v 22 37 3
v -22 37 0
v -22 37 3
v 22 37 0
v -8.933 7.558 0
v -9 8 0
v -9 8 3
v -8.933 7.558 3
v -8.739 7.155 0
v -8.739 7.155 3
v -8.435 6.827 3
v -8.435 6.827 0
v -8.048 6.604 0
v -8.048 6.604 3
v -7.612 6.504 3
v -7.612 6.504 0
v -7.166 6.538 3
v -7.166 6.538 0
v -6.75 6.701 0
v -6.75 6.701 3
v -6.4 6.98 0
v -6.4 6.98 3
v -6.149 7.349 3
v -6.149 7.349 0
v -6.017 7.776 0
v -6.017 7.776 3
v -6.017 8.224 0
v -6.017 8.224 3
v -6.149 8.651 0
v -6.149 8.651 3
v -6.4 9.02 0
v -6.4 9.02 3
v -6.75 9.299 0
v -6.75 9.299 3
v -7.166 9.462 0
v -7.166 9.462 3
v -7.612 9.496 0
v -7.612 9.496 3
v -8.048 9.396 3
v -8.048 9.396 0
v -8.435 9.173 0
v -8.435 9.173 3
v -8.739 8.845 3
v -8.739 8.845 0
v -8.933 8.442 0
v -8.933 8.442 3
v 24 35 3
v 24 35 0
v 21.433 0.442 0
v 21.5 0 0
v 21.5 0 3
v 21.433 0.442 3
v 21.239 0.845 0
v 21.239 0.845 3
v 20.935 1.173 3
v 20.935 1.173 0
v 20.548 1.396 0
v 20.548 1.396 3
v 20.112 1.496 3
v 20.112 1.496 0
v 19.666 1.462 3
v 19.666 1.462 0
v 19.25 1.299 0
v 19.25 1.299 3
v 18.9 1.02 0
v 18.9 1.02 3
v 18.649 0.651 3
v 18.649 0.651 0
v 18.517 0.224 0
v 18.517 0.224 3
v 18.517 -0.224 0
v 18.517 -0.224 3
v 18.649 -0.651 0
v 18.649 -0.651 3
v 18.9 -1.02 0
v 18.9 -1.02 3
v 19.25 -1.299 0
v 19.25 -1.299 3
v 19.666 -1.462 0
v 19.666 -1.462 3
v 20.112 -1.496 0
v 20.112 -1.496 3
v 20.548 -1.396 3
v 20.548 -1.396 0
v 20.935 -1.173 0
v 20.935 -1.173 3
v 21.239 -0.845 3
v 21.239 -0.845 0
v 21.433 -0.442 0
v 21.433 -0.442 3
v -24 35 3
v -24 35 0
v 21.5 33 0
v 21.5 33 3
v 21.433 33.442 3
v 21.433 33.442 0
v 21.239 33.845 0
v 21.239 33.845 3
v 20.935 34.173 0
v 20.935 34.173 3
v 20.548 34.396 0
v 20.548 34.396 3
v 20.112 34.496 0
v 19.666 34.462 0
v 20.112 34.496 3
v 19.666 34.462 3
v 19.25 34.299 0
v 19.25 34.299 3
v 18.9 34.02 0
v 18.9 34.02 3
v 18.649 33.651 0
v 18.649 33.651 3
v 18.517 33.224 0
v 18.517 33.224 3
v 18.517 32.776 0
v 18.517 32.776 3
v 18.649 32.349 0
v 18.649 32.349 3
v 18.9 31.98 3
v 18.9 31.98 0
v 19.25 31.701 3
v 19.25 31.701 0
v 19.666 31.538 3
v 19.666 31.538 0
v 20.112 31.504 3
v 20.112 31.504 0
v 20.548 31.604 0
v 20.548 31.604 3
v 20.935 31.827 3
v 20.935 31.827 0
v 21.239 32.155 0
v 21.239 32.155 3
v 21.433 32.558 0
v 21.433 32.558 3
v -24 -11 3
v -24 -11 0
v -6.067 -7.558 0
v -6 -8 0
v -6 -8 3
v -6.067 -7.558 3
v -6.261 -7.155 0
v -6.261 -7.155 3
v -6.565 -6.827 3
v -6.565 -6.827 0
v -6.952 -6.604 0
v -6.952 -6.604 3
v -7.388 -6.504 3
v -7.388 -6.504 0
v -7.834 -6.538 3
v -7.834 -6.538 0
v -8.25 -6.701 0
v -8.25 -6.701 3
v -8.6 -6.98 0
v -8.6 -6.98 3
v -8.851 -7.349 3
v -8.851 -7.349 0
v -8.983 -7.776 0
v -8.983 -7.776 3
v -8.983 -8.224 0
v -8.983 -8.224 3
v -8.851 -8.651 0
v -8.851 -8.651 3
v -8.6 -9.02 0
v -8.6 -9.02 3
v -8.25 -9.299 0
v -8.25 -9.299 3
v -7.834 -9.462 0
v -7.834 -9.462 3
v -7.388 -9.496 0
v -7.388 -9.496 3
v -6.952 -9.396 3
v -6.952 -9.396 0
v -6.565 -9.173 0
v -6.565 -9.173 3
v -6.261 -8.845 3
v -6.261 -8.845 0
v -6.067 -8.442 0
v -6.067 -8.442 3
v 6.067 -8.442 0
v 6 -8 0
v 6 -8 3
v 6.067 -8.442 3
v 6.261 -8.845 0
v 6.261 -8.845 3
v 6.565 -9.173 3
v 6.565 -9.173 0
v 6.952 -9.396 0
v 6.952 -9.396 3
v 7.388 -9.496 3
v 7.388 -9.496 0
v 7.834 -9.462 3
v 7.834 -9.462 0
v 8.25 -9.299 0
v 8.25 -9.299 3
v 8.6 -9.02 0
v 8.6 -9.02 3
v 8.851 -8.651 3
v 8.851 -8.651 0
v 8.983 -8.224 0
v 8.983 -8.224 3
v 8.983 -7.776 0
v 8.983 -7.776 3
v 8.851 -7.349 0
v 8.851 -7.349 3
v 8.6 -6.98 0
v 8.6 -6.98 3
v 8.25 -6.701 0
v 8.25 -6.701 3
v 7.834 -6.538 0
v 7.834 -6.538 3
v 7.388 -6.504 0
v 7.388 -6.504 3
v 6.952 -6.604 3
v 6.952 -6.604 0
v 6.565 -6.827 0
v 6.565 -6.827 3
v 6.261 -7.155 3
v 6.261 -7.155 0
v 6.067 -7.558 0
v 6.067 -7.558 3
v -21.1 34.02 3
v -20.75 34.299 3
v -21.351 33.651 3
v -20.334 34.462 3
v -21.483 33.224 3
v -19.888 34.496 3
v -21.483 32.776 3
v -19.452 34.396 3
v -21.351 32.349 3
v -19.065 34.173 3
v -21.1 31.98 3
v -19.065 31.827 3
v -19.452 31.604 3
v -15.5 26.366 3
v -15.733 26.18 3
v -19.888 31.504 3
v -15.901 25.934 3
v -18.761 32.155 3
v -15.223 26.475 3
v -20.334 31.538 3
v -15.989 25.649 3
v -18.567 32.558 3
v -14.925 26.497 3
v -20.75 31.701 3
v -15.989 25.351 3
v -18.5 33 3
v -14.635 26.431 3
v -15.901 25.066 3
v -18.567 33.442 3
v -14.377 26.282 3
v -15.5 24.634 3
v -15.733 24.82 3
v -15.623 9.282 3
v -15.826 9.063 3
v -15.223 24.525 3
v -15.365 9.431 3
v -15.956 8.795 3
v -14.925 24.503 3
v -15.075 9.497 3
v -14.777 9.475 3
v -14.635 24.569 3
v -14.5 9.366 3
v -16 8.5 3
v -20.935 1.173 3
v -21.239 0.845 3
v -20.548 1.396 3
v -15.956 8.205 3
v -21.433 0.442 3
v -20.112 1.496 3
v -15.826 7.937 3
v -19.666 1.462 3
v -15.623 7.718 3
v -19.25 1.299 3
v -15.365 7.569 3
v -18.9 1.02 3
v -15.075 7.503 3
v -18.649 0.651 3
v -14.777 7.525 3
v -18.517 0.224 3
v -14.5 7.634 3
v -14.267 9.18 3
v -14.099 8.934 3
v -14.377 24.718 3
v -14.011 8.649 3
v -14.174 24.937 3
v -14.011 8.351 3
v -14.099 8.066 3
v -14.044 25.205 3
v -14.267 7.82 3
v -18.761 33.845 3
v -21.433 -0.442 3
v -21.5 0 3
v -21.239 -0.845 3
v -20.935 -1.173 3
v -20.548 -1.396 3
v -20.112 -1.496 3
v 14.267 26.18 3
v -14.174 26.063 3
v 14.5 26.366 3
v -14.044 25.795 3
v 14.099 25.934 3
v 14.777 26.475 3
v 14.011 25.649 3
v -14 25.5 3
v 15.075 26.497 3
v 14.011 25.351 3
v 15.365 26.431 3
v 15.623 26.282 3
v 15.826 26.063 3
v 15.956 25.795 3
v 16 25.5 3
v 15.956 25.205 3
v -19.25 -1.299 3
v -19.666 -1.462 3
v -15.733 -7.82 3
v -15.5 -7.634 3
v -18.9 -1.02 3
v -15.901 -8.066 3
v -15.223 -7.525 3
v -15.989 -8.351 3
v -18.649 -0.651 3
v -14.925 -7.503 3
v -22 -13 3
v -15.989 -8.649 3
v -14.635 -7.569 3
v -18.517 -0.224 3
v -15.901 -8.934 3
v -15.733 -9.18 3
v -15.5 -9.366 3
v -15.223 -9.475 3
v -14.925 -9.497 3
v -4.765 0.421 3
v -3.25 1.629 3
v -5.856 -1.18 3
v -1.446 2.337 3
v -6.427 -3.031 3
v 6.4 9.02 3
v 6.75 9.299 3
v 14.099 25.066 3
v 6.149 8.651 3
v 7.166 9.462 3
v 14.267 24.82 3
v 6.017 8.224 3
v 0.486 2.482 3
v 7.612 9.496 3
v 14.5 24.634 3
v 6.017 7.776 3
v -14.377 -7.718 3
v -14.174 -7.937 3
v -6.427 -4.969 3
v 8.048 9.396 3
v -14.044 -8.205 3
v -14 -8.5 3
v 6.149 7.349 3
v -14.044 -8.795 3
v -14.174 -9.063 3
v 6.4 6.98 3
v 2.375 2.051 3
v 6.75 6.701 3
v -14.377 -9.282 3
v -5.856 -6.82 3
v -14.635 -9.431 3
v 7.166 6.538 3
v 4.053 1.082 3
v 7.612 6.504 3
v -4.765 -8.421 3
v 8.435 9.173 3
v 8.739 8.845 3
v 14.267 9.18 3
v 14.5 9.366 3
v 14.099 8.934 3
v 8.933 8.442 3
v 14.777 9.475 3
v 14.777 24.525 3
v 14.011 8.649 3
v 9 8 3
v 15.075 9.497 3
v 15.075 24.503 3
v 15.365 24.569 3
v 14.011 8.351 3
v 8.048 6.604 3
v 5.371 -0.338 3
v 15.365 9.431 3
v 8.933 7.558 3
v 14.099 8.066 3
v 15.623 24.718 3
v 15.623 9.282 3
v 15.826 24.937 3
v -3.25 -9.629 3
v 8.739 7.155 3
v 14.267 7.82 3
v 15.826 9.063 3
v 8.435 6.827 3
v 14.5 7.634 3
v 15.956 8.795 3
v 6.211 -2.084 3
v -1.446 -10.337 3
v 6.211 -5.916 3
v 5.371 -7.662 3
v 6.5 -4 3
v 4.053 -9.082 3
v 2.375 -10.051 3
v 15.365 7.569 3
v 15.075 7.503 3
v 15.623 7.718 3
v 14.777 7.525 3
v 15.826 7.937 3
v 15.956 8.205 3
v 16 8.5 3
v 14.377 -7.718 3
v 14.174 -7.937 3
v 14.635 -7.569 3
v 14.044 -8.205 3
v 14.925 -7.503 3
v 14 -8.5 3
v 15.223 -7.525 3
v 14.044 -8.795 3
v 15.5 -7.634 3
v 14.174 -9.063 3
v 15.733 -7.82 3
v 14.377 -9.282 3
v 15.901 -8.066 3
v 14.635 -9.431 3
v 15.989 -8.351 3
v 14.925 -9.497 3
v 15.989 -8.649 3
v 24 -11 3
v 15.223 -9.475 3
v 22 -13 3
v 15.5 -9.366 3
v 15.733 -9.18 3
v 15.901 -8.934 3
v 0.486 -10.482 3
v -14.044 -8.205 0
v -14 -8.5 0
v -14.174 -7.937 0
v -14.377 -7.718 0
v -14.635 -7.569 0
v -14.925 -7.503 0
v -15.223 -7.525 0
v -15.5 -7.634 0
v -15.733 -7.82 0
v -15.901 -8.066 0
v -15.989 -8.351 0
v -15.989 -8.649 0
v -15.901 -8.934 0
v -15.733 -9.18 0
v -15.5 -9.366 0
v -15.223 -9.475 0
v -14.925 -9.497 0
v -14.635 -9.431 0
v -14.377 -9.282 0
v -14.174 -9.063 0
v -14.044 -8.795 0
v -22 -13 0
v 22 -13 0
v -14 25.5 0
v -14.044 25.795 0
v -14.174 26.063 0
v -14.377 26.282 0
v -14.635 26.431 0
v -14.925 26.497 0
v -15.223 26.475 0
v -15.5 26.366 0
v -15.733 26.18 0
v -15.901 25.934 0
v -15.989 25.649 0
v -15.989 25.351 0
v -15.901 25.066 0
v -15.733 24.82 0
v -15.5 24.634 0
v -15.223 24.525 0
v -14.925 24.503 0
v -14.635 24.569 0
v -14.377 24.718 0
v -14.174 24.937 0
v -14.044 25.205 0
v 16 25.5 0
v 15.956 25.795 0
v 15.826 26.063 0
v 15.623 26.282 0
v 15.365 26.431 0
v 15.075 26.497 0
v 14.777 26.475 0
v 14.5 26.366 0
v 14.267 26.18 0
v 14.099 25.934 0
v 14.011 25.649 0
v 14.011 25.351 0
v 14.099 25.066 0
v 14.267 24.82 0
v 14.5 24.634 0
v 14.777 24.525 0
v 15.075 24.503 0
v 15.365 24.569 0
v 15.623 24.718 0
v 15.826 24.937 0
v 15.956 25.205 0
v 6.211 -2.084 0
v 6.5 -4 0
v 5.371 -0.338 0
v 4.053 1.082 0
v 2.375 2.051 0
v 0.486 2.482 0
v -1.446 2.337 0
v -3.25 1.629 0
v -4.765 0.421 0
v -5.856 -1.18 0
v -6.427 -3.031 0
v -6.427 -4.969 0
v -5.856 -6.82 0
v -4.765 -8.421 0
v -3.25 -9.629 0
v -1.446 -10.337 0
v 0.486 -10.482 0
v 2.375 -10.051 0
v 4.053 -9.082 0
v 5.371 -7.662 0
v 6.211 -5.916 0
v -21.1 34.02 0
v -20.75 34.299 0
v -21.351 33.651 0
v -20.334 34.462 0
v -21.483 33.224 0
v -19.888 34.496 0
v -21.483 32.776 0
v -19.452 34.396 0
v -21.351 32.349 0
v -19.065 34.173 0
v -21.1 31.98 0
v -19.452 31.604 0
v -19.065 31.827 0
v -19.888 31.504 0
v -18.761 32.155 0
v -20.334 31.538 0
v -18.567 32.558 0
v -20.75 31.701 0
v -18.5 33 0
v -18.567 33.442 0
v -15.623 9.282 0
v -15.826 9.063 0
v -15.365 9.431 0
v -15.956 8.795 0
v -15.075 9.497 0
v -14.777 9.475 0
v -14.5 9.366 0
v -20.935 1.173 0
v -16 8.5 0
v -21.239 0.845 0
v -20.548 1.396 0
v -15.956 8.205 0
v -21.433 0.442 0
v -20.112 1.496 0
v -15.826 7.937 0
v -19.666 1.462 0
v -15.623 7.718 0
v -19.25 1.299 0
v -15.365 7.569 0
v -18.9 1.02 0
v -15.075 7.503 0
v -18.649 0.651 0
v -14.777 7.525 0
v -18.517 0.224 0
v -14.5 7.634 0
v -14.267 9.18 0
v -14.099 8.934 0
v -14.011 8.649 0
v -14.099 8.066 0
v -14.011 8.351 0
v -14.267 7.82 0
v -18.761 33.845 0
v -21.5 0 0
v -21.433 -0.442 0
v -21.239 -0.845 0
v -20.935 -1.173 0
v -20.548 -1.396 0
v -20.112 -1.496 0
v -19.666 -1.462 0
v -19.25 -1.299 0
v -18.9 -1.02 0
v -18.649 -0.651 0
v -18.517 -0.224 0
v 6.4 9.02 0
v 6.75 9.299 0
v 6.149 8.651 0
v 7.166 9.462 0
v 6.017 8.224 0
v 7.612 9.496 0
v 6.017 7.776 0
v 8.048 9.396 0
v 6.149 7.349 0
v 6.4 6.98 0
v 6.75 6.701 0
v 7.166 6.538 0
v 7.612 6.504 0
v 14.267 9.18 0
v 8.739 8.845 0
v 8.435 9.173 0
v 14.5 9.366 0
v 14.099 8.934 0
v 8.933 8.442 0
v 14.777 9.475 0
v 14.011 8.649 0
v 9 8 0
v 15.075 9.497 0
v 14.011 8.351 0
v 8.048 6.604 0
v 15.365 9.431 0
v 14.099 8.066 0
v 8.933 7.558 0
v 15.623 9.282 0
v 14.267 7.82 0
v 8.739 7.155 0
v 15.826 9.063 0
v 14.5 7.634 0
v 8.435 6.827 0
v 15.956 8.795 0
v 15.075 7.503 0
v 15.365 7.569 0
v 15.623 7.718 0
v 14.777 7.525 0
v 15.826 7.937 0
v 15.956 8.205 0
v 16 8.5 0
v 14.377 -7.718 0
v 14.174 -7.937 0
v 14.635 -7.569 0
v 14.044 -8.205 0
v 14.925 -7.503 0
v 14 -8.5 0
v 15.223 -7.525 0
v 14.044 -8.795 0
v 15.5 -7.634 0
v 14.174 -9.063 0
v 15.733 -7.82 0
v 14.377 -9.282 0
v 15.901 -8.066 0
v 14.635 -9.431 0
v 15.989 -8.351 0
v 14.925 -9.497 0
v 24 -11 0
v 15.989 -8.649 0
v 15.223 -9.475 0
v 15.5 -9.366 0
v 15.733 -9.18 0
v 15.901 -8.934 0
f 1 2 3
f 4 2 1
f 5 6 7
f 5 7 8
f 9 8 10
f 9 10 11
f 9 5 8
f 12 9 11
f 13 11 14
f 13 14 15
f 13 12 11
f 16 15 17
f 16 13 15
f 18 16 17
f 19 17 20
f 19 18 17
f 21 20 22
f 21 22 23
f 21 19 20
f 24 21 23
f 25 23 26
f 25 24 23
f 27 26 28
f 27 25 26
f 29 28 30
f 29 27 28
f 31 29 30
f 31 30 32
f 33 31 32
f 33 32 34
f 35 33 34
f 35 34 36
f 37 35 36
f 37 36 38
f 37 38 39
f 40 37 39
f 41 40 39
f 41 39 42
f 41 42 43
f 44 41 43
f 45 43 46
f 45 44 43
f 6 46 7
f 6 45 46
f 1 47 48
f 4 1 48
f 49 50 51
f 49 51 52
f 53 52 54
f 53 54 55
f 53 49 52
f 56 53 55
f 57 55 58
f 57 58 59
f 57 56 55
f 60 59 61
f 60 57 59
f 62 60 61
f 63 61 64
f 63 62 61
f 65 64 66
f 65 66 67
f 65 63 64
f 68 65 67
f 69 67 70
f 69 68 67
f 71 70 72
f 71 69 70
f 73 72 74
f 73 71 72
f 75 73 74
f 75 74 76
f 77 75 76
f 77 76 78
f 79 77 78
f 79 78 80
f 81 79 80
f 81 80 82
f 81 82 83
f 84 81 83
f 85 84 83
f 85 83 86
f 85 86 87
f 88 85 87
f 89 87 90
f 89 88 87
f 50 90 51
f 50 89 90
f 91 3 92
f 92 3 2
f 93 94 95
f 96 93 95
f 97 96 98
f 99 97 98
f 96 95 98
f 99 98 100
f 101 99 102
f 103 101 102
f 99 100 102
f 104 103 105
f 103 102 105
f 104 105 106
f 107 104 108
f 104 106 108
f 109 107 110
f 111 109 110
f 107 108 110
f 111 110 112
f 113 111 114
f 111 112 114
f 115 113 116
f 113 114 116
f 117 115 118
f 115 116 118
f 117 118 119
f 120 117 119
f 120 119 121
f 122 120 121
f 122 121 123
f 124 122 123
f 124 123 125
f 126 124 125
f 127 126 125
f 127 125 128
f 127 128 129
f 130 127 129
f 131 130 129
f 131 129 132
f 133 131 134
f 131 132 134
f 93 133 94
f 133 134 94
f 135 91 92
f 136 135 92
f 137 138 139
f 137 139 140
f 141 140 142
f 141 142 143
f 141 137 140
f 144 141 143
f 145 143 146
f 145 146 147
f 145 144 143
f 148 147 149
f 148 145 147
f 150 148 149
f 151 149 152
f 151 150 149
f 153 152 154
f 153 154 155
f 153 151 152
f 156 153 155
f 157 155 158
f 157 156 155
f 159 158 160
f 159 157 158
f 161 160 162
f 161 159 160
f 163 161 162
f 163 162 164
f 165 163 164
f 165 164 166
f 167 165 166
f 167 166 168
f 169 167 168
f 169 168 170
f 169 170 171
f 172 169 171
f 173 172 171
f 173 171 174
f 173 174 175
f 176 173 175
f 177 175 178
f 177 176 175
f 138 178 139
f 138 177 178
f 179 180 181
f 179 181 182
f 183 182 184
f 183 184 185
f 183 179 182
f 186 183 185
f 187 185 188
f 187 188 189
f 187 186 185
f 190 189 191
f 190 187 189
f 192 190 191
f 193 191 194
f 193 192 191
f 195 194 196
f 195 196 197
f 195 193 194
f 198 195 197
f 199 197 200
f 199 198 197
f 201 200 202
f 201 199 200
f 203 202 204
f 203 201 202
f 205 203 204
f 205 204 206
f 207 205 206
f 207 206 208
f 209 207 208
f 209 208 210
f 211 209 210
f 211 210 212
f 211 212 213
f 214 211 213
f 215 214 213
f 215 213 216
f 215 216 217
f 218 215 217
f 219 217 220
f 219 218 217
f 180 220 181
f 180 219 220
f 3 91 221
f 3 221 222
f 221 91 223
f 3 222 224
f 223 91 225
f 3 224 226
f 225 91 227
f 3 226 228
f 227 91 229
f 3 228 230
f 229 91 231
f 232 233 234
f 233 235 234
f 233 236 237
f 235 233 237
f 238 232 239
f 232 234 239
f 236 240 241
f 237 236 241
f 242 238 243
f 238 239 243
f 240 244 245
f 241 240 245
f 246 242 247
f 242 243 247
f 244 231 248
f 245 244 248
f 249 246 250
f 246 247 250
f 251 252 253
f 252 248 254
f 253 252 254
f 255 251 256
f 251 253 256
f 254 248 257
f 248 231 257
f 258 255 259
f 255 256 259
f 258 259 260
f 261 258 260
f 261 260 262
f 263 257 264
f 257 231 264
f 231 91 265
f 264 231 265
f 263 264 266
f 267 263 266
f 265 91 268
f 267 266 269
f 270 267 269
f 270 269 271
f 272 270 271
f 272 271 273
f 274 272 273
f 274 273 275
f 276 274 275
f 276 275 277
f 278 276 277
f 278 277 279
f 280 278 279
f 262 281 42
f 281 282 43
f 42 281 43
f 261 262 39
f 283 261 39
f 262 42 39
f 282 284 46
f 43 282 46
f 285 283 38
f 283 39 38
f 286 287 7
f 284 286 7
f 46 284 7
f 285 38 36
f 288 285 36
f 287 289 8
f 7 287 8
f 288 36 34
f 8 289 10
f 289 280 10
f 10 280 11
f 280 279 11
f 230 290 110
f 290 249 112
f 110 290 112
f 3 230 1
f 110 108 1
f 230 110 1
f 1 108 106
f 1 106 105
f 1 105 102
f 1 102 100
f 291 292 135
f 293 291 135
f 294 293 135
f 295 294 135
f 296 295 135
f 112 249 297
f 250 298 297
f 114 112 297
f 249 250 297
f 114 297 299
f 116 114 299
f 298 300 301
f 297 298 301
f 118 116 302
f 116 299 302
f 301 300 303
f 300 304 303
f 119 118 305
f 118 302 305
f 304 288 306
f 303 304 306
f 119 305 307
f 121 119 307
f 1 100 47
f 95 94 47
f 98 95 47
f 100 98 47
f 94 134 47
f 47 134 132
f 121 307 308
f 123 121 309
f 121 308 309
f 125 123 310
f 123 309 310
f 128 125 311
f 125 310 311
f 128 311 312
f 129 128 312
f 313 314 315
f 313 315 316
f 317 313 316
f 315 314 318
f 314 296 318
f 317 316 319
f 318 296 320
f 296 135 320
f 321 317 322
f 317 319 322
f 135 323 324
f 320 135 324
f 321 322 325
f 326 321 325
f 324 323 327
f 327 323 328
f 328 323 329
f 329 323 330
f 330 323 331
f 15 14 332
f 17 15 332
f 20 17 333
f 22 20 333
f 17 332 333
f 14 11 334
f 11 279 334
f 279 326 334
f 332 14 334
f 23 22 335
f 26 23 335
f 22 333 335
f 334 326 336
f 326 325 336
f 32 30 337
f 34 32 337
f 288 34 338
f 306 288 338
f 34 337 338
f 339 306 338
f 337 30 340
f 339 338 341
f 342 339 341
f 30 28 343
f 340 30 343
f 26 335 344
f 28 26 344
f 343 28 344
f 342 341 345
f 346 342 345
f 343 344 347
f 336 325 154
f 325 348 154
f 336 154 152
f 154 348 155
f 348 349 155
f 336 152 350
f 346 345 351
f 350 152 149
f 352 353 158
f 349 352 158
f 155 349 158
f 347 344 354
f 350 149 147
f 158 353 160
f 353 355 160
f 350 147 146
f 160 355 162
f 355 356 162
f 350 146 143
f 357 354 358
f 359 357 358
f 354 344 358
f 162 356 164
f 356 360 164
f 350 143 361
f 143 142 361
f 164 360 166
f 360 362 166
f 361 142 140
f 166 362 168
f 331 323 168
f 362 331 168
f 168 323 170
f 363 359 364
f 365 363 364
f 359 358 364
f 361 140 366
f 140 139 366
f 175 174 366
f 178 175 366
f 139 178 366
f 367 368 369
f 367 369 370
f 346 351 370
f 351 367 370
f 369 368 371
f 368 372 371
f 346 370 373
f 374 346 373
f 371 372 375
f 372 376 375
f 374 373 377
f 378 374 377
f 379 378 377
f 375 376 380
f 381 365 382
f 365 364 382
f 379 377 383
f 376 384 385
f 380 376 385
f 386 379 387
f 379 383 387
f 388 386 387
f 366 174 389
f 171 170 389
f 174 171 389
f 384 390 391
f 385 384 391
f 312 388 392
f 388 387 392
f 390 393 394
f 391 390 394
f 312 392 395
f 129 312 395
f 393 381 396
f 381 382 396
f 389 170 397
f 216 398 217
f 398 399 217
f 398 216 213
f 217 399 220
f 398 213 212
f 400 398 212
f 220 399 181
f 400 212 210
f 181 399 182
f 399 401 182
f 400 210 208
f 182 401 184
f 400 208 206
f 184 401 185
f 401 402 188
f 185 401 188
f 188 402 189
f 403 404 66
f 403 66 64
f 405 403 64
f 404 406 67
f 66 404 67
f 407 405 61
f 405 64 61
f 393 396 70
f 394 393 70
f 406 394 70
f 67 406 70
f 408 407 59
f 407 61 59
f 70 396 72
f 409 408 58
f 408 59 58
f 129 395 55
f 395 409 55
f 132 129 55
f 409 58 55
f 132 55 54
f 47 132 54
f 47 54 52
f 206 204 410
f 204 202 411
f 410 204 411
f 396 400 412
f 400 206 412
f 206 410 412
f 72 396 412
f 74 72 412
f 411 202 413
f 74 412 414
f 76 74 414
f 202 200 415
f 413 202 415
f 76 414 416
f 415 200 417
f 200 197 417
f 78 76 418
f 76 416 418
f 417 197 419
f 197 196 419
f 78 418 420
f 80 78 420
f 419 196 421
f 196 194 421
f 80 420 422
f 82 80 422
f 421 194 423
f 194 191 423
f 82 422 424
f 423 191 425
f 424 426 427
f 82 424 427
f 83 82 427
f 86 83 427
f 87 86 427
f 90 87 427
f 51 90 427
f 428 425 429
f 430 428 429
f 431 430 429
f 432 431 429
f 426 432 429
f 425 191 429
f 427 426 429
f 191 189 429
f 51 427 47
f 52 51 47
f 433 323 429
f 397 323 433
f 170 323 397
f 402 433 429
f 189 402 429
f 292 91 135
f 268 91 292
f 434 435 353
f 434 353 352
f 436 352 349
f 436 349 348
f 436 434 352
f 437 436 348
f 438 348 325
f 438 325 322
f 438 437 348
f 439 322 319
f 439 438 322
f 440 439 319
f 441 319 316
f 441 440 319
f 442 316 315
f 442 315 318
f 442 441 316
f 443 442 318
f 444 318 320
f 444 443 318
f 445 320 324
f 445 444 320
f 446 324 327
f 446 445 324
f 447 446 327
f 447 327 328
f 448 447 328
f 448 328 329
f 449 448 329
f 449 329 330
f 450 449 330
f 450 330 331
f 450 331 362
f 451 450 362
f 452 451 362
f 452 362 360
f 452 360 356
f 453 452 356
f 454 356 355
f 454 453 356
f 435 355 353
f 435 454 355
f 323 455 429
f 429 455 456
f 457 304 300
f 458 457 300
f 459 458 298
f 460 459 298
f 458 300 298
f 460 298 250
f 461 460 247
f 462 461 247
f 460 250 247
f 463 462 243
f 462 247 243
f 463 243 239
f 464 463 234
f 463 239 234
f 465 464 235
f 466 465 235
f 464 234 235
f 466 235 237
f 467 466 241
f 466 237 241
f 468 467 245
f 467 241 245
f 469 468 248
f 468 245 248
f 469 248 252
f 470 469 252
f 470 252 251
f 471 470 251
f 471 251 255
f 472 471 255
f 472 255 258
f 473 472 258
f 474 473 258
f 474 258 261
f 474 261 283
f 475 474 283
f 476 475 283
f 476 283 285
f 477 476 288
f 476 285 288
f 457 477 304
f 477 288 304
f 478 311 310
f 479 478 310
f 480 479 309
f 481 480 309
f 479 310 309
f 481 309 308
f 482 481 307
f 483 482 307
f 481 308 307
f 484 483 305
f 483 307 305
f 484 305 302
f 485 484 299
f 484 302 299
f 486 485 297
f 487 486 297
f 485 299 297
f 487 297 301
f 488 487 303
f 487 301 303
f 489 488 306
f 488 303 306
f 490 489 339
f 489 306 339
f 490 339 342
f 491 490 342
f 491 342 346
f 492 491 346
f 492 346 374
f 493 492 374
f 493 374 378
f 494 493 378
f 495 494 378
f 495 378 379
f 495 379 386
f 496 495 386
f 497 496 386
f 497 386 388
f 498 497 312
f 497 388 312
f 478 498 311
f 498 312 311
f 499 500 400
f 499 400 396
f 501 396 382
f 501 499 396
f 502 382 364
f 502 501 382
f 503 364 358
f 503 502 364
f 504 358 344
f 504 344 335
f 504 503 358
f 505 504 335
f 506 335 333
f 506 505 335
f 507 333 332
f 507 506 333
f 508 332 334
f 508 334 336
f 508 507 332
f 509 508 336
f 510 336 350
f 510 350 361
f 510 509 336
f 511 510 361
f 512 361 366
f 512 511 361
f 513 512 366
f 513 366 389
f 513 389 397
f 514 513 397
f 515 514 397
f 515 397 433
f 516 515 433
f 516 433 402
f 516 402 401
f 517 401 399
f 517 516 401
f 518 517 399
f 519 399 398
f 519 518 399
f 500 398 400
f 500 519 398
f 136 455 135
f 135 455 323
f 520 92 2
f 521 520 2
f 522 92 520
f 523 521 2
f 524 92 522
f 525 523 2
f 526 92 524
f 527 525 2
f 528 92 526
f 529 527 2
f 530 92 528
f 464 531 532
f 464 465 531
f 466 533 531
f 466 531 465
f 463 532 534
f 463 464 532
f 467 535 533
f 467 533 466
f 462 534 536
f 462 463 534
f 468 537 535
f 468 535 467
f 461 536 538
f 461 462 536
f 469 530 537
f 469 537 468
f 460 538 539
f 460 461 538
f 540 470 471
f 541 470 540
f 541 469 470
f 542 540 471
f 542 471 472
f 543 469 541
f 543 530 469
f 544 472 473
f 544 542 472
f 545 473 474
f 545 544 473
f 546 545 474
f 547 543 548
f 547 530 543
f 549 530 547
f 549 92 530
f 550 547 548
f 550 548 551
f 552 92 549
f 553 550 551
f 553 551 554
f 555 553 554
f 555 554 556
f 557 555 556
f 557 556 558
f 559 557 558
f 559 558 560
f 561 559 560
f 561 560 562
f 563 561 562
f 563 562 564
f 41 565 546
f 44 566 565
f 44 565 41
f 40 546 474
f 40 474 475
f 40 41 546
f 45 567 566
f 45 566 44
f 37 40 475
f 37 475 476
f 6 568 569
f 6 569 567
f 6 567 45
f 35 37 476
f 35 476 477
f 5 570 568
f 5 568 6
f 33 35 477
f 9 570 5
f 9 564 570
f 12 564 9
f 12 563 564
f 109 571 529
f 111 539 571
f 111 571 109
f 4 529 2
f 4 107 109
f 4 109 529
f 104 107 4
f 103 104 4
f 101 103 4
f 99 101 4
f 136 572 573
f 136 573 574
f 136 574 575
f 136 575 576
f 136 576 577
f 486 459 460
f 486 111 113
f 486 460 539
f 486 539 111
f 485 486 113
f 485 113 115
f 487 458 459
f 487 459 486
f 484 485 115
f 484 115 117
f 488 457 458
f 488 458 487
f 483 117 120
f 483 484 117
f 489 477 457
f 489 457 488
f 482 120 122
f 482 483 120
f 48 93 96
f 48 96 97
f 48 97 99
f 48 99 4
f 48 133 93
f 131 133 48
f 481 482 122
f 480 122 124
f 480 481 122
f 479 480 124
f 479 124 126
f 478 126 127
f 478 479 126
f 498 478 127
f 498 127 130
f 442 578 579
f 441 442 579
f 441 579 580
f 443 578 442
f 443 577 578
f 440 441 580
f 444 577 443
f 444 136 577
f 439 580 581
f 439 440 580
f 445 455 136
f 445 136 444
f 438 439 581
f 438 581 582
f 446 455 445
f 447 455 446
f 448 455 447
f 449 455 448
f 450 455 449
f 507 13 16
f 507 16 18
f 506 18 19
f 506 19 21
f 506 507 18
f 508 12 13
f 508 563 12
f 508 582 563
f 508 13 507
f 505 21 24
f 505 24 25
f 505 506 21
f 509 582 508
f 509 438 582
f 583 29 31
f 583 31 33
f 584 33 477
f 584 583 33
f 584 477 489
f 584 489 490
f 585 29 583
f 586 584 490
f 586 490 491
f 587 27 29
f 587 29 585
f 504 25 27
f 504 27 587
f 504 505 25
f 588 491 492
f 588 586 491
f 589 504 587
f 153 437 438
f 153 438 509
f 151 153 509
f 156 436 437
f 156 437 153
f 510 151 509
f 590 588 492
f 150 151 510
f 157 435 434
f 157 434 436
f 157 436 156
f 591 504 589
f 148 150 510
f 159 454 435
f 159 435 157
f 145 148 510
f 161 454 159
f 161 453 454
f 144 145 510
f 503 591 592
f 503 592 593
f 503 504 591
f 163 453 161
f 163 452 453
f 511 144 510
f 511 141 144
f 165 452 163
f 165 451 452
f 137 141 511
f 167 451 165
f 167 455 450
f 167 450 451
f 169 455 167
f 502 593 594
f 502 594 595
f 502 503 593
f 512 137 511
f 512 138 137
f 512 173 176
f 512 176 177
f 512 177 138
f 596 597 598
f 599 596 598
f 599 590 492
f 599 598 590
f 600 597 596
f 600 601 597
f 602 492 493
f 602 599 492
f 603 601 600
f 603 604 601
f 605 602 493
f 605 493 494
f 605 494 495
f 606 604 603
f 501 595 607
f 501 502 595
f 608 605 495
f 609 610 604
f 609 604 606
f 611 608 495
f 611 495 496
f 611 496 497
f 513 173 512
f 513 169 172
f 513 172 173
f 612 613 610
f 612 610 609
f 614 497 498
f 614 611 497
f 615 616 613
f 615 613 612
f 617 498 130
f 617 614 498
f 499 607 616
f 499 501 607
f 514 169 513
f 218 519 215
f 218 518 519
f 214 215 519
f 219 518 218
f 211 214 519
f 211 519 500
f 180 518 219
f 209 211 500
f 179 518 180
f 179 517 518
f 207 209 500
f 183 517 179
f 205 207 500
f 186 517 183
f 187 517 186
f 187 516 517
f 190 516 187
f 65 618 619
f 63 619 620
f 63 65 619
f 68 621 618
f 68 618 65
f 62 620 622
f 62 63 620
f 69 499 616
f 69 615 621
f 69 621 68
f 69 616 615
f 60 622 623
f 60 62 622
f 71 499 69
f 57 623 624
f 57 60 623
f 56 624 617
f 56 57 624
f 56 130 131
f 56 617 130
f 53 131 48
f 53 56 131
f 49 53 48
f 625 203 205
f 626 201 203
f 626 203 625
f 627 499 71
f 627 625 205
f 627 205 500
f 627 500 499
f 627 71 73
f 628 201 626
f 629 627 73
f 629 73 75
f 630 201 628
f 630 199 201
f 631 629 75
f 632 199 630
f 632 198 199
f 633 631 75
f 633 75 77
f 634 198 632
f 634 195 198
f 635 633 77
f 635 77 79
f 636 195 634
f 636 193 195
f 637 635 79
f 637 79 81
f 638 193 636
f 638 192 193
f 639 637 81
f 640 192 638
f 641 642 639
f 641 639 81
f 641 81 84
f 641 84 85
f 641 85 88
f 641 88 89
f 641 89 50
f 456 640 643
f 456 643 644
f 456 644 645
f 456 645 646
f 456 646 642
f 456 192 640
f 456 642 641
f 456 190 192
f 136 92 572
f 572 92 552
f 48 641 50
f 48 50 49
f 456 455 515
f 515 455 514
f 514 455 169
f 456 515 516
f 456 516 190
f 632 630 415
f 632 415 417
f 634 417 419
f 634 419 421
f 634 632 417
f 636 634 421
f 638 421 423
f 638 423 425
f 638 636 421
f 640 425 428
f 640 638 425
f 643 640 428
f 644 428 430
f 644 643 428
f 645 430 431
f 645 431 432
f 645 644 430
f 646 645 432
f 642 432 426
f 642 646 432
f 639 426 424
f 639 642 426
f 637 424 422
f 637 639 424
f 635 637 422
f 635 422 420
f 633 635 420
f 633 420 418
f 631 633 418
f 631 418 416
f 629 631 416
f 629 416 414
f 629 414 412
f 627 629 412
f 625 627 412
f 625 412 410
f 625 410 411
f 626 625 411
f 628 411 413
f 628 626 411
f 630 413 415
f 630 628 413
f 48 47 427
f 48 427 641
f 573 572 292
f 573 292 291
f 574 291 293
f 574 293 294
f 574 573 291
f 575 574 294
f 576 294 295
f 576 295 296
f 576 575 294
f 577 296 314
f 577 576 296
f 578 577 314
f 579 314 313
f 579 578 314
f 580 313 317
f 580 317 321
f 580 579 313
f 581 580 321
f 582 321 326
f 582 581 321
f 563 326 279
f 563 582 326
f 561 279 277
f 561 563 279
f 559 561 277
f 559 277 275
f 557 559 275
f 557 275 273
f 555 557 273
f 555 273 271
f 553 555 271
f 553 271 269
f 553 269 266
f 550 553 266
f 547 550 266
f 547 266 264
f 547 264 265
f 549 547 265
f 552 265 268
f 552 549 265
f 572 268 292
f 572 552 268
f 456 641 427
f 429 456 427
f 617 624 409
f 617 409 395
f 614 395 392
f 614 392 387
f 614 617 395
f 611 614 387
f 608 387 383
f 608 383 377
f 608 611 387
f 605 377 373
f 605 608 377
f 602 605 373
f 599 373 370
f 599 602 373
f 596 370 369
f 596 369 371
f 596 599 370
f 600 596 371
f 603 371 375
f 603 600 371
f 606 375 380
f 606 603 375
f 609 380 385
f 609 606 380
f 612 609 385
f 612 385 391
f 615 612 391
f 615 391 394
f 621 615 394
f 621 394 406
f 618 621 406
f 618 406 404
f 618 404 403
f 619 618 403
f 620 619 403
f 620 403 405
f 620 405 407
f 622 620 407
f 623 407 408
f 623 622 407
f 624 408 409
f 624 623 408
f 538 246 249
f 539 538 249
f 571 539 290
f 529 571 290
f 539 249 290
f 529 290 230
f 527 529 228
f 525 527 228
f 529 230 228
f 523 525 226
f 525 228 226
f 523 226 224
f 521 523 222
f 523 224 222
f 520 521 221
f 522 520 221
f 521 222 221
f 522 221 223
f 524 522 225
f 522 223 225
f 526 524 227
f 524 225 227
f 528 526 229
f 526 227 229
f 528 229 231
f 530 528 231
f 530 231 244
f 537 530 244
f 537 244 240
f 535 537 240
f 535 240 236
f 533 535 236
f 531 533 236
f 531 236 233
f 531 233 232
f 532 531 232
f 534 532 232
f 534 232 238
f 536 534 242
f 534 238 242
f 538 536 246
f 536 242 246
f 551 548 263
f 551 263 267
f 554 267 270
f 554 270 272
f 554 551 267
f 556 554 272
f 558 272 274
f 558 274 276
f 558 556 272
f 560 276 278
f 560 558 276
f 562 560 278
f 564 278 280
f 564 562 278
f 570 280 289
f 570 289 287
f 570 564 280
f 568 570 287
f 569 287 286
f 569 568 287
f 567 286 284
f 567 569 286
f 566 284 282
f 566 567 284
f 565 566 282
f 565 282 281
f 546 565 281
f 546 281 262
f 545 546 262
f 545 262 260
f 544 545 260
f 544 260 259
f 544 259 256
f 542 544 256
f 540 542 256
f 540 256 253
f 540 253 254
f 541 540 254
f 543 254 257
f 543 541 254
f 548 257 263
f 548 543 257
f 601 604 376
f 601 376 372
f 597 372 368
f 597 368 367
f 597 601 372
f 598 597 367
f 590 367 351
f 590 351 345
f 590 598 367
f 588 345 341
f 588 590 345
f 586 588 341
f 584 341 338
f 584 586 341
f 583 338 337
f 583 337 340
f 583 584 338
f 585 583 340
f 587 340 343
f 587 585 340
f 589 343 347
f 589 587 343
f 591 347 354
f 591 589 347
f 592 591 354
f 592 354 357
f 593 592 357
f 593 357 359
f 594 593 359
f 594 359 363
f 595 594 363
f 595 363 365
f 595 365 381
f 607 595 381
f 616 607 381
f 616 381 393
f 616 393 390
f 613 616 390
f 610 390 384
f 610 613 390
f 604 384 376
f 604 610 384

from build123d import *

# Parameters (mm, degrees)
ESBO_O1_W                = 48
ESBO_O1_H                = 26
ESBO_O1_R                = 1.5
ESBO_O1_R_2              = 1
ESBO_O1_R_3              = 6.5
RESSALTO_EXTRUS_O1_DEPTH = 3
ESBO_O7_W                = 48
ESBO_O7_H                = 3
RESSALTO_EXTRUS_O4_DEPTH = 24
ESBO_O8_R                = 1
ESBO_O8_R_2              = 1.5
CORTE_EXTRUS_O2_DEPTH    = 3
CHANFRO2_SIZE            = 2


with BuildPart() as part:
    # Esboço1 → Ressalto-extrusão1 (new body)
    with BuildSketch(Plane.XY):
        Rectangle(ESBO_O1_W, ESBO_O1_H)
        with Locations((20, 0)):
            Circle(ESBO_O1_R, mode=Mode.SUBTRACT)
        with Locations((15, 8.5)):
            Circle(ESBO_O1_R_2, mode=Mode.SUBTRACT)
        with Locations((7.5, 8)):
            Circle(ESBO_O1_R, mode=Mode.SUBTRACT)
        with Locations(Location((15, -8.5, 0), (0, 0, 180))):
            Circle(ESBO_O1_R_2, mode=Mode.SUBTRACT)
        with Locations(Location((7.5, -8, 0), (0, 0, 180))):
            Circle(ESBO_O1_R, mode=Mode.SUBTRACT)
        with Locations(Location((-15, 8.5, 0), (0, 0, 180))):
            Circle(ESBO_O1_R_2, mode=Mode.SUBTRACT)
        with Locations((-7.5, -8)):
            Circle(ESBO_O1_R, mode=Mode.SUBTRACT)
        with Locations((-15, -8.5)):
            Circle(ESBO_O1_R_2, mode=Mode.SUBTRACT)
        with Locations(Location((-7.5, 8, 0), (0, 0, 180))):
            Circle(ESBO_O1_R, mode=Mode.SUBTRACT)
        with Locations(Location((-20, 0, 0), (0, 0, 180))):
            Circle(ESBO_O1_R, mode=Mode.SUBTRACT)
        with Locations((0, -4)):
            Circle(ESBO_O1_R_3, mode=Mode.SUBTRACT)
    extrude(amount=RESSALTO_EXTRUS_O1_DEPTH)

    # Esboço7 → Ressalto-extrusão4 (add)
    with BuildSketch(Plane(origin=(0, 13, 0), x_dir=(1, 0, 0), z_dir=(0, 1, 0))):
        with Locations((0, -1.5)):
            Rectangle(ESBO_O7_W, ESBO_O7_H)
    extrude(amount=RESSALTO_EXTRUS_O4_DEPTH)

    # Esboço8 → Corte-extrusão2 (cut)
    with BuildSketch(Plane.XY.offset(3)):
        with Locations((-15, 25.5)):
            Circle(ESBO_O8_R)
        with Locations((-20, 33)):
            Circle(ESBO_O8_R_2)
        with Locations((20, 33)):
            Circle(ESBO_O8_R_2)
        with Locations((15, 25.5)):
            Circle(ESBO_O8_R)
    extrude(amount=-CORTE_EXTRUS_O2_DEPTH, mode=Mode.SUBTRACT)

    # Chanfro2
    chanfro2_edges = [part.edges().sort_by_distance(p)[0] for p in [
        (-24, 37, 1.5),
        (24, 37, 1.5),
        (24, -13, 1.5),
        (-24, -13, 1.5),
    ]]
    chamfer(chanfro2_edges, length=CHANFRO2_SIZE)


solid = part.part
